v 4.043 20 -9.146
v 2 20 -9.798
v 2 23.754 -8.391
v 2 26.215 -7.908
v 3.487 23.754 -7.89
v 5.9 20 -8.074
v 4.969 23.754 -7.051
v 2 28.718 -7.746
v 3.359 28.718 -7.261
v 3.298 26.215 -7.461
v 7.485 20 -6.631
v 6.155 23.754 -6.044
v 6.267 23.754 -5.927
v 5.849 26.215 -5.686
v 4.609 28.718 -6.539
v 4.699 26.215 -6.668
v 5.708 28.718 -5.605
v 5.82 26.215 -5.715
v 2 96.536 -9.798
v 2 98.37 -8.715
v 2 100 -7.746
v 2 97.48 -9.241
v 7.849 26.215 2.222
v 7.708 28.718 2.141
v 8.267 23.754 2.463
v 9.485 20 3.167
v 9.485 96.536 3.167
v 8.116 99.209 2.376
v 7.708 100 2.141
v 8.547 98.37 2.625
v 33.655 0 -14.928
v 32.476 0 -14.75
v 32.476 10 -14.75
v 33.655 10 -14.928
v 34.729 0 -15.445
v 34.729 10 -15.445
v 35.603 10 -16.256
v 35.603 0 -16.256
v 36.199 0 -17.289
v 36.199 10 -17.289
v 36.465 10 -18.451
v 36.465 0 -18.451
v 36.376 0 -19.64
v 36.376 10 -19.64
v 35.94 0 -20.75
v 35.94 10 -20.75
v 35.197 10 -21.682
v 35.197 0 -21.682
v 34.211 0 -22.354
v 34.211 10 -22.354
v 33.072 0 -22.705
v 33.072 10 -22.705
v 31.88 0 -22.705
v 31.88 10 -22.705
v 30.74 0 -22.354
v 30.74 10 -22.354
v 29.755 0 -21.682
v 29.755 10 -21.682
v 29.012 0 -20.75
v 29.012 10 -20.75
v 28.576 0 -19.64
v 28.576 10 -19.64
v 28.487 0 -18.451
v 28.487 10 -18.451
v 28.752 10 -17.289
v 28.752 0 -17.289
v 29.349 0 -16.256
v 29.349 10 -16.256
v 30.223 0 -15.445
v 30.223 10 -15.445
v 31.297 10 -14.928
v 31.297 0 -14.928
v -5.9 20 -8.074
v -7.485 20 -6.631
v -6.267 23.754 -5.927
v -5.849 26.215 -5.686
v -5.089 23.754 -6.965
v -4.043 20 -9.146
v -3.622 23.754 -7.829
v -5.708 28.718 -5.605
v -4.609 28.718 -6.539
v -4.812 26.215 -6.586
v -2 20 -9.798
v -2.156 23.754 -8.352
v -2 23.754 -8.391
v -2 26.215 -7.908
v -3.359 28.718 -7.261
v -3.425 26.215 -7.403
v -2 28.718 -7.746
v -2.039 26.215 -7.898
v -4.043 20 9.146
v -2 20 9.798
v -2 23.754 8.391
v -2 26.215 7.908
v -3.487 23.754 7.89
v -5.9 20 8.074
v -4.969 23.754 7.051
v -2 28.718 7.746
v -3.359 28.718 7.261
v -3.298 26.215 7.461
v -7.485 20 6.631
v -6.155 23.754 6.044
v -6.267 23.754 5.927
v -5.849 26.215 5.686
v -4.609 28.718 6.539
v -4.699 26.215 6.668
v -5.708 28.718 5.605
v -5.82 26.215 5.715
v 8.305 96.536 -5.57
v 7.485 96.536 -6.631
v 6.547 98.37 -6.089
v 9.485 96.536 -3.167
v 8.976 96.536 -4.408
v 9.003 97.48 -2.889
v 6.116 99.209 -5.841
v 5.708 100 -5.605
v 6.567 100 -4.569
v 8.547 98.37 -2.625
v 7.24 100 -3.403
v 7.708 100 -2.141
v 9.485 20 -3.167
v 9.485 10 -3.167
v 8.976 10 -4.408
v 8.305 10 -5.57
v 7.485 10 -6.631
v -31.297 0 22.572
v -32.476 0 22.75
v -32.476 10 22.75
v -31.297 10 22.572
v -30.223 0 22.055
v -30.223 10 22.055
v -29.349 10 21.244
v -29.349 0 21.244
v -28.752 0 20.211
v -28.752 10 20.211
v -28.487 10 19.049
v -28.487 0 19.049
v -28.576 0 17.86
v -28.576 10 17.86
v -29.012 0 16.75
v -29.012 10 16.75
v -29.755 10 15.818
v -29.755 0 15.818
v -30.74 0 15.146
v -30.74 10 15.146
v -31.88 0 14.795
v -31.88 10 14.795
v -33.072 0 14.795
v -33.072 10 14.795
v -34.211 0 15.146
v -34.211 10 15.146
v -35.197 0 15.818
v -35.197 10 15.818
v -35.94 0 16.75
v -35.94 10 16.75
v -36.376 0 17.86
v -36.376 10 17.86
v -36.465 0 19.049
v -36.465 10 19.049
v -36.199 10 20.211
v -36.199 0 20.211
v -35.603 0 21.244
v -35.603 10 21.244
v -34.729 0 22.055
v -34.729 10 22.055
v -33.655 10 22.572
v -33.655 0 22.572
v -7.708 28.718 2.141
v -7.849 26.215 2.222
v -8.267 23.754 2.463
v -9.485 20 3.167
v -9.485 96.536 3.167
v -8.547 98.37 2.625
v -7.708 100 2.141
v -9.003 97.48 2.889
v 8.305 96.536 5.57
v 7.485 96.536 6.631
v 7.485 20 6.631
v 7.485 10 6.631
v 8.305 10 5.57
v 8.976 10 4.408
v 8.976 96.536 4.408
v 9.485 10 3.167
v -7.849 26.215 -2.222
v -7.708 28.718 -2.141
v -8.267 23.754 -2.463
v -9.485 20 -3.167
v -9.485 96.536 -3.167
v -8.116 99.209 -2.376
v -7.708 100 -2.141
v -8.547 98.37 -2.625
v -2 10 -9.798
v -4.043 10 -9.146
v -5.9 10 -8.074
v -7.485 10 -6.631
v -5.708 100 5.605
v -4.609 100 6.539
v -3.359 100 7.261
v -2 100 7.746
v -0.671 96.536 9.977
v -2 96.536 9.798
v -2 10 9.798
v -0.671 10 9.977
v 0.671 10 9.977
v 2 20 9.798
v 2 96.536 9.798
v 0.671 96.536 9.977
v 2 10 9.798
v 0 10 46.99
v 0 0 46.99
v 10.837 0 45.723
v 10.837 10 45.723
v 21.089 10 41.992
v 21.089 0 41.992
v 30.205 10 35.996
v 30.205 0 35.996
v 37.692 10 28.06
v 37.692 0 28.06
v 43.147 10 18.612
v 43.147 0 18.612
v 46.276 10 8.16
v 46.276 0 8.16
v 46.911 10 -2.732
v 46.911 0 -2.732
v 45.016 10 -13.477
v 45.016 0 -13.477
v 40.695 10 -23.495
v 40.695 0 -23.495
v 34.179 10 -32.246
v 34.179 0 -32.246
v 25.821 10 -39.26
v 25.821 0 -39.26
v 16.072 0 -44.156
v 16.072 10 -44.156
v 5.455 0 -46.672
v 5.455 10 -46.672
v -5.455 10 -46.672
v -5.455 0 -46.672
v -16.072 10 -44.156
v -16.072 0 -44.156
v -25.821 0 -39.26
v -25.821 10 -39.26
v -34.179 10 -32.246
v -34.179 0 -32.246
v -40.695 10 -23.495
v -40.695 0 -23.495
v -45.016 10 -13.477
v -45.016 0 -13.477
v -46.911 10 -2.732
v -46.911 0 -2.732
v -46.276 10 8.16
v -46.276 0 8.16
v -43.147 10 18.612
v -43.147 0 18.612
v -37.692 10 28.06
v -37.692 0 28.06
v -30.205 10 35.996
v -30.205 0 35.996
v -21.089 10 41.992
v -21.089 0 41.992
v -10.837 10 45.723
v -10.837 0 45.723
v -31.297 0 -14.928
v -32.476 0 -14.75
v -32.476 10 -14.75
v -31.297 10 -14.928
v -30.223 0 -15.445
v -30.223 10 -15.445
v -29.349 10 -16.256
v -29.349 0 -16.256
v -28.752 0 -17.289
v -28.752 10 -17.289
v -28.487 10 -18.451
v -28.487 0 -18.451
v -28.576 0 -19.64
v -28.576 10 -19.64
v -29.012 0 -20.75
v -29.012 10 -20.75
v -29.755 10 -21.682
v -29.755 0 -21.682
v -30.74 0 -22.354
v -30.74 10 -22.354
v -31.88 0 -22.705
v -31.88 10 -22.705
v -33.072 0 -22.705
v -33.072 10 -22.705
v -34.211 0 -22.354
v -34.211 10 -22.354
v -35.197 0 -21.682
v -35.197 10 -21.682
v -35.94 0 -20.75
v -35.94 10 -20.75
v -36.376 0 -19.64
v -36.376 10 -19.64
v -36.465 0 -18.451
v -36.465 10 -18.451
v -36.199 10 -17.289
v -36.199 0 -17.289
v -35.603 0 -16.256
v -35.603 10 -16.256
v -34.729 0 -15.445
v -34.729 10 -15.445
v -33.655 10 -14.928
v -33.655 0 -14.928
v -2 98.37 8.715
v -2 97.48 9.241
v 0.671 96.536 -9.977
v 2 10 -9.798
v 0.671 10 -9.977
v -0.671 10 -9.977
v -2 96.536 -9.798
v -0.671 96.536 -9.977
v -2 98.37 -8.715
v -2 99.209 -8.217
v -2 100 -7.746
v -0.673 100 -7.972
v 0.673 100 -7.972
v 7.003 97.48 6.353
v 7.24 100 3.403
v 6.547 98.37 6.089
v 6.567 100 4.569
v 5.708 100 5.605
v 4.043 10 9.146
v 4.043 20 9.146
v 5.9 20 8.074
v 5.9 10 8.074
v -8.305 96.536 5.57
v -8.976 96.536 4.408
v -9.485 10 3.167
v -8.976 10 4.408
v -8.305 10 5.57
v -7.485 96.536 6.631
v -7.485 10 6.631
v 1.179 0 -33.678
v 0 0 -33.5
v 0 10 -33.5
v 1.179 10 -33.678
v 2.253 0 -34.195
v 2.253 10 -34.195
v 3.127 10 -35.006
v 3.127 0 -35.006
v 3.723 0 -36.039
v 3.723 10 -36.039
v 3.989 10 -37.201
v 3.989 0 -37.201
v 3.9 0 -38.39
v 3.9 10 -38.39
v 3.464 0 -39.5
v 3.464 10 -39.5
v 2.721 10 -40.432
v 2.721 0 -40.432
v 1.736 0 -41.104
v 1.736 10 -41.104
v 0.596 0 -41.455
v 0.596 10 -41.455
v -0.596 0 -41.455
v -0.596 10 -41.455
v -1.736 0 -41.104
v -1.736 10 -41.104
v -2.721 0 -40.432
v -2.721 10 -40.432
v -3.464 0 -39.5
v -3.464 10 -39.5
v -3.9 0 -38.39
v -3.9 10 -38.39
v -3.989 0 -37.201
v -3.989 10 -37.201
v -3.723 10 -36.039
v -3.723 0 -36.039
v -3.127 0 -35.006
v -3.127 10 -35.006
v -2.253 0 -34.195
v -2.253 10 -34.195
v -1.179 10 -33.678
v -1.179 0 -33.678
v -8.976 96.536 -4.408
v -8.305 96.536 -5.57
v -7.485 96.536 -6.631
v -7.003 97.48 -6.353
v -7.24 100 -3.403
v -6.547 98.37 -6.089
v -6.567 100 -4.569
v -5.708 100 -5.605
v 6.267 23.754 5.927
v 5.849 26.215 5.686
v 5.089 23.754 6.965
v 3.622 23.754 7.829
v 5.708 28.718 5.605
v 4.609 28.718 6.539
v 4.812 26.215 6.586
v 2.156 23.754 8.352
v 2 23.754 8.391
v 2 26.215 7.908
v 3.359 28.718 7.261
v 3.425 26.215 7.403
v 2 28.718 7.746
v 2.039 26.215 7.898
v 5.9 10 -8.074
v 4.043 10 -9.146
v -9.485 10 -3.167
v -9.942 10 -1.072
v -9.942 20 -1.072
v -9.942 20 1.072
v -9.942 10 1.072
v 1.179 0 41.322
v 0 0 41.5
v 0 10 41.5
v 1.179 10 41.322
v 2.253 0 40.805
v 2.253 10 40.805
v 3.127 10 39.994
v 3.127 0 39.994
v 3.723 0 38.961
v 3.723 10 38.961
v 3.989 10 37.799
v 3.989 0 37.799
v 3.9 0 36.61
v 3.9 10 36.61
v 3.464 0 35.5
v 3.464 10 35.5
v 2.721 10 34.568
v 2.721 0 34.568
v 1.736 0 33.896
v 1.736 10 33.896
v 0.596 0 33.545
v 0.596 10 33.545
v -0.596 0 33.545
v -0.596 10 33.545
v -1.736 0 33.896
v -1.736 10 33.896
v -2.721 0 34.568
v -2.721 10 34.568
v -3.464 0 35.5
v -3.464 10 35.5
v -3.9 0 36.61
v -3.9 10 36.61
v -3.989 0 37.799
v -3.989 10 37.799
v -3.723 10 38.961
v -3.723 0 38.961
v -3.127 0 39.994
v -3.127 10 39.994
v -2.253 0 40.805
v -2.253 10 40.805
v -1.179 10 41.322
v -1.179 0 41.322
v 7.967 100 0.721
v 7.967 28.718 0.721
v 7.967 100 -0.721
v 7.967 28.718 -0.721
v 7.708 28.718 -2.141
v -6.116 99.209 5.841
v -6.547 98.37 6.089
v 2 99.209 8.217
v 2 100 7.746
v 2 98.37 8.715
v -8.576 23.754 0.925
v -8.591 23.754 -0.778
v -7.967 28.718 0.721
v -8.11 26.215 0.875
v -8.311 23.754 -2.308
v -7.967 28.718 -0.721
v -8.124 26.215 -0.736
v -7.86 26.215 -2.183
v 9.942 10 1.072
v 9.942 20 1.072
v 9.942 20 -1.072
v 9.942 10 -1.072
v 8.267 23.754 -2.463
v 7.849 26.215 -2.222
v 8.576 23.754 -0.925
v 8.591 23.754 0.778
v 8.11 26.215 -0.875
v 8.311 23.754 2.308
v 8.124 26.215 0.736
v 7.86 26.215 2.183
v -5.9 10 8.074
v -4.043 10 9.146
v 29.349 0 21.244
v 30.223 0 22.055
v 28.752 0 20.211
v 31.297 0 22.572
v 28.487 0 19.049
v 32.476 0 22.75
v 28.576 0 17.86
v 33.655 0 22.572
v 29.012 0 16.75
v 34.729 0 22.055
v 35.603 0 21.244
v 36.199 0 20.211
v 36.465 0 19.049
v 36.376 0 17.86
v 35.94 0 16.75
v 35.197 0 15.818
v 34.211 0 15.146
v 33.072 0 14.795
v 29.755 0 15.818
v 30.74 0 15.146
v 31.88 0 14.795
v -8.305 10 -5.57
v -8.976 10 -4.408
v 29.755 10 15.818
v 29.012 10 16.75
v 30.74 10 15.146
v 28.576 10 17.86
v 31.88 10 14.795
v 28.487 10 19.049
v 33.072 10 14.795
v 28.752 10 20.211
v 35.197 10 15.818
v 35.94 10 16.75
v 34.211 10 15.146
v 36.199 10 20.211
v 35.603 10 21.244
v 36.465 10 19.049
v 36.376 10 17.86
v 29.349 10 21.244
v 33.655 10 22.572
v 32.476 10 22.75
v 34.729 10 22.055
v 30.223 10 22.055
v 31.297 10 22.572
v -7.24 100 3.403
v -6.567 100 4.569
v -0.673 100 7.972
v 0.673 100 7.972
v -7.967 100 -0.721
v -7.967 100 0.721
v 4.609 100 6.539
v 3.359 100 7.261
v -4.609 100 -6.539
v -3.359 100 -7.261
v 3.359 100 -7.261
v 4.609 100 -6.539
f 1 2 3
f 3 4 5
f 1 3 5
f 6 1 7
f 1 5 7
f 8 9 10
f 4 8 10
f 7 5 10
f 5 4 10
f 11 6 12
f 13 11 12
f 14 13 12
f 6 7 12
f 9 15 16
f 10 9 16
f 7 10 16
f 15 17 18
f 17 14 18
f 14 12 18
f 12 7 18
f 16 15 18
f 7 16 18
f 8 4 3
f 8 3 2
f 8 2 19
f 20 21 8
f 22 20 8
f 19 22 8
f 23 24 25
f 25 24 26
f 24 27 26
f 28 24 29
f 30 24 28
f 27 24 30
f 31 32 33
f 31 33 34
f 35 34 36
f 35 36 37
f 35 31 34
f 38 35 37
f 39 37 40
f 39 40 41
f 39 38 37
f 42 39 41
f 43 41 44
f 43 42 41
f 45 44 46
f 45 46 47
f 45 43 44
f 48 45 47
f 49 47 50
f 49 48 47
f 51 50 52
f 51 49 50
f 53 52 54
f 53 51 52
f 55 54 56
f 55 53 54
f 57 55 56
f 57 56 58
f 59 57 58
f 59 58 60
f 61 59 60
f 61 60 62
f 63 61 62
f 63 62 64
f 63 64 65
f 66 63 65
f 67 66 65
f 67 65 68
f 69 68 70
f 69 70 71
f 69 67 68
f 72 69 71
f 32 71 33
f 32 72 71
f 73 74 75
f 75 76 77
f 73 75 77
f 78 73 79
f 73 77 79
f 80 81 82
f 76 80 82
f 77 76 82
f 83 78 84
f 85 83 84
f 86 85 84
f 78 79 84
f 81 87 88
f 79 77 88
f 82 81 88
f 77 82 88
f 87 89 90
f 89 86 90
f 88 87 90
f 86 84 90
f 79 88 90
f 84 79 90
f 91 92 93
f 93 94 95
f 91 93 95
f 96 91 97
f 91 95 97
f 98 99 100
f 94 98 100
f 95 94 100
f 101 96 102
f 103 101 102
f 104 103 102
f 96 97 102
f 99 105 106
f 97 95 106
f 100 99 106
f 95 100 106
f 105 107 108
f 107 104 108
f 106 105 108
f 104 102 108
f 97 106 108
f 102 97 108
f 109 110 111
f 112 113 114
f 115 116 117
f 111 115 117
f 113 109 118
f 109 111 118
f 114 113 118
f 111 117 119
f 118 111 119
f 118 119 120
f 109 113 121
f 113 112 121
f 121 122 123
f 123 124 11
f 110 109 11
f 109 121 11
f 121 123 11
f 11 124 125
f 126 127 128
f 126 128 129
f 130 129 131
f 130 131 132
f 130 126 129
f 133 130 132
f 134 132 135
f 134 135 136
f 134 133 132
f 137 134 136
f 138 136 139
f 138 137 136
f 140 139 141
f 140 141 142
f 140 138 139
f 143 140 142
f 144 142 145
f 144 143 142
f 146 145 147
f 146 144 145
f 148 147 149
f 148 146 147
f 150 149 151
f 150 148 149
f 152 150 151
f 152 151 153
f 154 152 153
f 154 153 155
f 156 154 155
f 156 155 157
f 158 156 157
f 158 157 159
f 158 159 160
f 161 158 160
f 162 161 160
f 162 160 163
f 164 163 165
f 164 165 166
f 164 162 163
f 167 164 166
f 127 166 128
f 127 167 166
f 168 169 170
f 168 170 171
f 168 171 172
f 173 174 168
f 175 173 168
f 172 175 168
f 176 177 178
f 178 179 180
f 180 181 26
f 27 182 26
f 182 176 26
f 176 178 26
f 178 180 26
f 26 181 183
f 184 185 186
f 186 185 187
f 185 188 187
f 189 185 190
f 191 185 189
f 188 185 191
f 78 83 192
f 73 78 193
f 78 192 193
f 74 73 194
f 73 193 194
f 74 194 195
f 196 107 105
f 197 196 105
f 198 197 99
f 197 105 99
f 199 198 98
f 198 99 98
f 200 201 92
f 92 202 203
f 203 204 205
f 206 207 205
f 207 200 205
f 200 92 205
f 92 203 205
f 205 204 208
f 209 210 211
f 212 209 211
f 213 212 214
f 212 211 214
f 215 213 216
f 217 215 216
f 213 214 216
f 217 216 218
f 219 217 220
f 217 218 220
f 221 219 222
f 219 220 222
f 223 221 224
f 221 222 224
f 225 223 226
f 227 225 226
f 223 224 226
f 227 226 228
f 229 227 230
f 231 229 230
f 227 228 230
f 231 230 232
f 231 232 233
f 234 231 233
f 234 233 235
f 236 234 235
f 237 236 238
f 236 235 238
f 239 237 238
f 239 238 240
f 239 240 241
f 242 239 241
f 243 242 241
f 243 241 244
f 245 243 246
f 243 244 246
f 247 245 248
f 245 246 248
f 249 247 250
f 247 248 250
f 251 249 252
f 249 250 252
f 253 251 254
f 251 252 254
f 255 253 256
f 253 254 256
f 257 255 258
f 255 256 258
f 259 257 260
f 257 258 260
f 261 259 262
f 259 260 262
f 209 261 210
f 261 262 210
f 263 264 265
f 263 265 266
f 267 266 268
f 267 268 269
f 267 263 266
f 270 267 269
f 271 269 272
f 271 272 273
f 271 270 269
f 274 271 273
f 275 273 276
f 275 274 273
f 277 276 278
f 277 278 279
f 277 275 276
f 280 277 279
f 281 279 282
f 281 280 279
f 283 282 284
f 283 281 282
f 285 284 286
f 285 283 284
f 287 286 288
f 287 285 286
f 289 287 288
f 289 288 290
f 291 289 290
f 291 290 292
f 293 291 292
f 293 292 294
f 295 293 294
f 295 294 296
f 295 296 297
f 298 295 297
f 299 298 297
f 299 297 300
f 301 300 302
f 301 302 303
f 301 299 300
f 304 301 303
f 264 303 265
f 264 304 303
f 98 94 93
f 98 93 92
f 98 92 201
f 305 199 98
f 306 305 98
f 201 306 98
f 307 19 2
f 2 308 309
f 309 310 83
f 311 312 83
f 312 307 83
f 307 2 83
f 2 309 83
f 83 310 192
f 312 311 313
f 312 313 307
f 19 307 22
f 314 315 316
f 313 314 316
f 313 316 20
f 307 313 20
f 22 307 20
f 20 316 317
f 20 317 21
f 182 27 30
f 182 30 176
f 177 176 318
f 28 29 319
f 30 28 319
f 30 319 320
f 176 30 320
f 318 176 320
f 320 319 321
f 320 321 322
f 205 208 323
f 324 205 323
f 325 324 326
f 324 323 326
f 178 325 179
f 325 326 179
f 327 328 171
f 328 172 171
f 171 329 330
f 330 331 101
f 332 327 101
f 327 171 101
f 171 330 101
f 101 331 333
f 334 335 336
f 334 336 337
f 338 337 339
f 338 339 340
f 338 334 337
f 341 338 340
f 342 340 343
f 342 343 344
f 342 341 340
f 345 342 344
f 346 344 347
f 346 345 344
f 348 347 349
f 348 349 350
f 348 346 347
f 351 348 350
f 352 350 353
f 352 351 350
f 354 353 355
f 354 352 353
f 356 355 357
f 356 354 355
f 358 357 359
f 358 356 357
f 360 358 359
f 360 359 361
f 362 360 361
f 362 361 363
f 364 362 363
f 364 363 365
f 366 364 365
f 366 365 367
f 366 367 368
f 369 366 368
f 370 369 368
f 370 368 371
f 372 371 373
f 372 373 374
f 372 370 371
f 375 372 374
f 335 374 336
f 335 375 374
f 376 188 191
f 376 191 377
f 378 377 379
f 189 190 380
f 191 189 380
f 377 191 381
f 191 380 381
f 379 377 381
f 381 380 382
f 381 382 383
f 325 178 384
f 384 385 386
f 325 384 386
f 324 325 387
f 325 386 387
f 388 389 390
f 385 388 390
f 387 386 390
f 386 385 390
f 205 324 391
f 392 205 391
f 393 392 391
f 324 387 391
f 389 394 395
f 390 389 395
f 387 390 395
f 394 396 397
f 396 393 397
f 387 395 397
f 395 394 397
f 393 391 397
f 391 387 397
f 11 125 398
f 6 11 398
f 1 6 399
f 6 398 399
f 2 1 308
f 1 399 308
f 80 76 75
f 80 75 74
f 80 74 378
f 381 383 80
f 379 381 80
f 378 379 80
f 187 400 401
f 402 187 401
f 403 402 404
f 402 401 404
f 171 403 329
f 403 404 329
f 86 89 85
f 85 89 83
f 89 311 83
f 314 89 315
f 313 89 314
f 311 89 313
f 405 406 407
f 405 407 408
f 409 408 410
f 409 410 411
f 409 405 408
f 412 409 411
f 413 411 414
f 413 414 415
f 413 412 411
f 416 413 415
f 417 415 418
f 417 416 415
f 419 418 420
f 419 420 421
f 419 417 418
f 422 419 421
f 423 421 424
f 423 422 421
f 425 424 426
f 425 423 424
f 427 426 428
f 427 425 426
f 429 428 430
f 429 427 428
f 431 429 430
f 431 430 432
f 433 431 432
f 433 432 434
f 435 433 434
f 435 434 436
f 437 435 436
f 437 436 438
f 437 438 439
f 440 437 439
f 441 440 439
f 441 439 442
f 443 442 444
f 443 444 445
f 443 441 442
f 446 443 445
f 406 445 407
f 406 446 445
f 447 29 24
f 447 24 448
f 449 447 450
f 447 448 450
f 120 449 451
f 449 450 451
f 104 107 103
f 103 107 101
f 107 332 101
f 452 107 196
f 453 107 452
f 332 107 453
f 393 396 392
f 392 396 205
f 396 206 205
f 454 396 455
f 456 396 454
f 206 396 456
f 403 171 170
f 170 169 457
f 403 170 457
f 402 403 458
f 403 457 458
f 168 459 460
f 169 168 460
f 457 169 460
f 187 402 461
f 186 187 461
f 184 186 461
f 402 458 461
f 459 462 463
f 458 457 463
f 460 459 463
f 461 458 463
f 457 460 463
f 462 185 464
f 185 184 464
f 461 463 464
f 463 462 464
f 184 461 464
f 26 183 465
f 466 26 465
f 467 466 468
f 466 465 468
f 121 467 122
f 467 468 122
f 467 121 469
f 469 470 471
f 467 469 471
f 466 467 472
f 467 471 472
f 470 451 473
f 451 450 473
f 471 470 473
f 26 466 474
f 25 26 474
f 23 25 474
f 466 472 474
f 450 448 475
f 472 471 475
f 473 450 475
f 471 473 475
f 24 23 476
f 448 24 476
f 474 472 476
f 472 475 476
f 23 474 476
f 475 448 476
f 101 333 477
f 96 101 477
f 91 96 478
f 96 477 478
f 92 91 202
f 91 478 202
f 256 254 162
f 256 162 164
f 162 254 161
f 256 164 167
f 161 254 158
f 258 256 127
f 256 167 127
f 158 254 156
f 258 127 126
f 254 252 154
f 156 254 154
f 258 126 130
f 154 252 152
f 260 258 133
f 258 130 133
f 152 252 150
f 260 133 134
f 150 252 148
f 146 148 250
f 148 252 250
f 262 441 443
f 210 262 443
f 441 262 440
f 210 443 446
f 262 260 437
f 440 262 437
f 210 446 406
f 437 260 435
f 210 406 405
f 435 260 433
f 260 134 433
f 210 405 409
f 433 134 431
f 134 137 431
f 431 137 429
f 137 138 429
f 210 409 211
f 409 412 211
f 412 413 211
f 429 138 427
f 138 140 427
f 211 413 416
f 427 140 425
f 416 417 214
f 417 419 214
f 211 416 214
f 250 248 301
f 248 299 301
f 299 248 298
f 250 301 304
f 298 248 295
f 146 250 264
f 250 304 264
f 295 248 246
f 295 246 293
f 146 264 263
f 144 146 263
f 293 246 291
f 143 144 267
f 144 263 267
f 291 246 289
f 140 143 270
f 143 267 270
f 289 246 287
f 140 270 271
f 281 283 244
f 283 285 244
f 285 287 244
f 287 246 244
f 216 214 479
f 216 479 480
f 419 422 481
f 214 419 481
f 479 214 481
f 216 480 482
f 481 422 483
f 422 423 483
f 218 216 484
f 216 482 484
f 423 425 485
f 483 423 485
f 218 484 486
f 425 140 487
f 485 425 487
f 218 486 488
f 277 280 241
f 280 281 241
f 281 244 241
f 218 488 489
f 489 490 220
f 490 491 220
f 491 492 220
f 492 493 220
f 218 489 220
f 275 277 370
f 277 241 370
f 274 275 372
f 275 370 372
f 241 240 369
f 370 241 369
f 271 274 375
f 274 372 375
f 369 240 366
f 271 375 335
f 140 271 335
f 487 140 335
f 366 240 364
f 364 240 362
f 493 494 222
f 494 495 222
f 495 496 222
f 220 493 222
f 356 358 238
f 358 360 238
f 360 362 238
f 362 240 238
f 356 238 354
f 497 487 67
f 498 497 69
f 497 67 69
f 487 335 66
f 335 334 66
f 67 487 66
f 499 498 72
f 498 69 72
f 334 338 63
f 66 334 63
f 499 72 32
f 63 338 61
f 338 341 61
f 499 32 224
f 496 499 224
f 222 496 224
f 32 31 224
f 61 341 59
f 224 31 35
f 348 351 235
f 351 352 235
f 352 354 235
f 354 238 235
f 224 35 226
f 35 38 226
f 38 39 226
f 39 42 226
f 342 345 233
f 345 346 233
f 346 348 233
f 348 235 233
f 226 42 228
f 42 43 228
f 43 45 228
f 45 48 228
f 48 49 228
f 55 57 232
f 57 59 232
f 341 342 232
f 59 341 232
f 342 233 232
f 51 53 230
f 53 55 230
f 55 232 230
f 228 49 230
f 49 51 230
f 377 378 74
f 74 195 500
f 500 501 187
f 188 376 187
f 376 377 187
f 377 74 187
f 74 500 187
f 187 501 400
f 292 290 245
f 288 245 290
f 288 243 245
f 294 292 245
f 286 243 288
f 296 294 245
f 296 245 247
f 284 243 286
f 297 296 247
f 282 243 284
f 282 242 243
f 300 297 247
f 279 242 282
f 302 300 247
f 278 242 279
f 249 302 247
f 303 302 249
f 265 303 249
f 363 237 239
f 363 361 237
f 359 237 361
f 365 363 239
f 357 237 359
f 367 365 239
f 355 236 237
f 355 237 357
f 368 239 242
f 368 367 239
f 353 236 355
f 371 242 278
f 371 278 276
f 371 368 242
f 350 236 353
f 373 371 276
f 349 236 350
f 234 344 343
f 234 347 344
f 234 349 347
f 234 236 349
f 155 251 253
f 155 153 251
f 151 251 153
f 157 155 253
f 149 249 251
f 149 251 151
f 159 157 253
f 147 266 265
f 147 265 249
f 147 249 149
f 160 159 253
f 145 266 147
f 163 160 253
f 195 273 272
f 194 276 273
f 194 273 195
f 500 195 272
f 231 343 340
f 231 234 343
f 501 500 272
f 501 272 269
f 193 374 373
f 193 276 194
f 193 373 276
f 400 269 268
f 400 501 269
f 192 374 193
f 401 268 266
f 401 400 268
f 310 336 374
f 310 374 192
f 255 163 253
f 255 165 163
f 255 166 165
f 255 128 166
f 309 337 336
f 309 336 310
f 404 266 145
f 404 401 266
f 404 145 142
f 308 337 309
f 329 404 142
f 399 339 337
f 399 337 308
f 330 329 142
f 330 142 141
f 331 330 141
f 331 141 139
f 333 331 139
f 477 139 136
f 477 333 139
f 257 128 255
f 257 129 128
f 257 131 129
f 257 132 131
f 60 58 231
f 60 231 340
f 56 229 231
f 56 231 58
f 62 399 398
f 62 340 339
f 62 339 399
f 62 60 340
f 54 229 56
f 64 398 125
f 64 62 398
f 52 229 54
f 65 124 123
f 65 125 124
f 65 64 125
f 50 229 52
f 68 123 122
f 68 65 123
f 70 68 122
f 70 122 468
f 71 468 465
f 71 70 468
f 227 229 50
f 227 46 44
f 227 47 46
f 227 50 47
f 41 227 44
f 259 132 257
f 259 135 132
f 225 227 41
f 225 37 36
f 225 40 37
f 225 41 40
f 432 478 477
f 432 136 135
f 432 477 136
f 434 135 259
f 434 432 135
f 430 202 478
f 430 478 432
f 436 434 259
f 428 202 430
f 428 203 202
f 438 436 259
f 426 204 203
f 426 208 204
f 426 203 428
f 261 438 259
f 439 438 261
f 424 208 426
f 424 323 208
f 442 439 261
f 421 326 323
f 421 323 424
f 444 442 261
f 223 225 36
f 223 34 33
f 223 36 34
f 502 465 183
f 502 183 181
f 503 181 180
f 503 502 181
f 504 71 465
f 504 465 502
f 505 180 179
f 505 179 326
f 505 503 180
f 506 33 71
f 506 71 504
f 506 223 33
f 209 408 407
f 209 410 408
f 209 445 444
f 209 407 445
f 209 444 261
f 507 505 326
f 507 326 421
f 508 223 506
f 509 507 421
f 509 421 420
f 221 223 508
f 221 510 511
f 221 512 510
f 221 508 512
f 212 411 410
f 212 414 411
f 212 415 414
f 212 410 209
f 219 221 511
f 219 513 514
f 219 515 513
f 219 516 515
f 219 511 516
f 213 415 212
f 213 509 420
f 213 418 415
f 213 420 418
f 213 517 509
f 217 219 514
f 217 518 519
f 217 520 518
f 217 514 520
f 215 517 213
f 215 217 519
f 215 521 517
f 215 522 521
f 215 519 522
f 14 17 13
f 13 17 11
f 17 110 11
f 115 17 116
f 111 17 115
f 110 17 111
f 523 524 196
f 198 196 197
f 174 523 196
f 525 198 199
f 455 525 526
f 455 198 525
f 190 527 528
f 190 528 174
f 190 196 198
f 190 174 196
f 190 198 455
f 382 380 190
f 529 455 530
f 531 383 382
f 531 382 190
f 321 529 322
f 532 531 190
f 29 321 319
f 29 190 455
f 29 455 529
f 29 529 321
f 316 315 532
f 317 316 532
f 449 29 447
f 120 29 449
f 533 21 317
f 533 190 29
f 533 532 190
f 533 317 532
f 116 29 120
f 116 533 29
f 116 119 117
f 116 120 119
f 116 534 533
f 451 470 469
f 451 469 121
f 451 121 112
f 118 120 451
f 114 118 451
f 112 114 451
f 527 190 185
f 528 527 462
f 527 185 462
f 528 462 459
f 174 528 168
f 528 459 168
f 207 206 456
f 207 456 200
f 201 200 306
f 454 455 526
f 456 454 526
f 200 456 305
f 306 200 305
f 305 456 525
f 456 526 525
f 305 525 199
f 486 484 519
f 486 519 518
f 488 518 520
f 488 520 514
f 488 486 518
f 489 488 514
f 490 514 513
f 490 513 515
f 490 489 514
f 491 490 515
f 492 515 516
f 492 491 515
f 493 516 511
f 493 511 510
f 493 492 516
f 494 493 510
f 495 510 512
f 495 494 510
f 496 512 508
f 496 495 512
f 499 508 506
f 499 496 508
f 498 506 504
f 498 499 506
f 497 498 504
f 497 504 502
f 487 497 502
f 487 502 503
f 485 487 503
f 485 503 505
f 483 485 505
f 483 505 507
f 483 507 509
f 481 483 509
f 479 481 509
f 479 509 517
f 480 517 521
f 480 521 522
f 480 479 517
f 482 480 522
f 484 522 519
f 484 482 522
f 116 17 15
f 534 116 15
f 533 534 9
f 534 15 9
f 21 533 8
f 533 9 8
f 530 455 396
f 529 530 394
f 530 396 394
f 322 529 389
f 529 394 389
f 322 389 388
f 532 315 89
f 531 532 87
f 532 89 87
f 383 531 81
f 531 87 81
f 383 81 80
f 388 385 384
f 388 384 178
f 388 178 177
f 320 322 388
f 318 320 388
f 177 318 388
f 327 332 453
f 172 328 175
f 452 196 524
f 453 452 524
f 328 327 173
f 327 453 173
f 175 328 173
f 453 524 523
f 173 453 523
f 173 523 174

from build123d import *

# Parameters (mm, degrees)
SKETCH1_R           = 46.99
SKETCH1_R_2         = 8.509
SKETCH1_R_3         = 4
BOSS_EXTRUDE1_DEPTH = 10
BOSS_EXTRUDE2_DEPTH = 90
SKETCH4_R           = 10
BOSS_EXTRUDE3_DEPTH = 10
FILLET2_R           = 20


with BuildPart() as part:
    # Sketch1 → Boss-Extrude1 (new body)
    # profile 1 of 2: a face of its own
    with BuildSketch(Plane(origin=(0, 0, 0), x_dir=(1, 0, 0), z_dir=(0, 1, 0))):
        with Locations(Location((0, 0, 0), (0, 0, 270))):
            Circle(SKETCH1_R)
        Circle(SKETCH1_R_2, mode=Mode.SUBTRACT)
        with Locations(Location((-32.475952642, 18.75, 0), (0, 0, 270))):
            Circle(SKETCH1_R_3, mode=Mode.SUBTRACT)
        with Locations(Location((-32.475952642, -18.75, 0), (0, 0, 270))):
            Circle(SKETCH1_R_3, mode=Mode.SUBTRACT)
        with Locations(Location((0, -37.5, 0), (0, 0, 270))):
            Circle(SKETCH1_R_3, mode=Mode.SUBTRACT)
        with Locations(Location((32.475952642, -18.75, 0), (0, 0, 270))):
            Circle(SKETCH1_R_3, mode=Mode.SUBTRACT)
        with Locations(Location((32.475952642, 18.75, 0), (0, 0, 270))):
            Circle(SKETCH1_R_3, mode=Mode.SUBTRACT)
        with Locations(Location((0, 37.5, 0), (0, 0, 270))):
            Circle(SKETCH1_R_3, mode=Mode.SUBTRACT)
    # profile 2 of 2: a face of its own
    with BuildSketch(Plane(origin=(0, 0, 0), x_dir=(1, 0, 0), z_dir=(0, 1, 0))):
        Circle(SKETCH1_R_2)
    extrude(amount=BOSS_EXTRUDE1_DEPTH)

    # Sketch2 → Boss-Extrude2 (add)
    with BuildSketch(Plane(origin=(0, 10, 0), x_dir=(1, 0, 0), z_dir=(0, 1, 0))):
        with BuildLine():
            Line((-5.708203932, 5.605034154), (-7.485281374, 6.631030293))
            ThreePointArc((-7.485281374, 6.631030293), (-8.660254038, 5), (-9.485281374, 3.166928678))
            Line((-9.485281374, 3.166928678), (-7.708203932, 2.140932539))
            ThreePointArc((-7.708203932, 2.140932539), (-8, 0), (-7.708203932, -2.140932539))
            Line((-7.708203932, -2.140932539), (-9.485281374, -3.166928678))
            ThreePointArc((-9.485281374, -3.166928678), (-8.660254038, -5), (-7.485281374, -6.631030293))
            Line((-7.485281374, -6.631030293), (-5.708203932, -5.605034154))
            ThreePointArc((-5.708203932, -5.605034154), (-4, -6.92820323), (-2, -7.745966692))
            Line((-2, -7.745966692), (-2, -9.797958971))
            ThreePointArc((-2, -9.797958971), (0, -10), (2, -9.797958971))
            Line((2, -9.797958971), (2, -7.745966692))
            ThreePointArc((2, -7.745966692), (4, -6.92820323), (5.708203932, -5.605034154))
            Line((5.708203932, -5.605034154), (7.485281374, -6.631030293))
            ThreePointArc((7.485281374, -6.631030293), (8.660254038, -5), (9.485281374, -3.166928678))
            Line((9.485281374, -3.166928678), (7.708203932, -2.140932539))
            ThreePointArc((7.708203932, -2.140932539), (8, 0), (7.708203932, 2.140932539))
            Line((7.708203932, 2.140932539), (9.485281374, 3.166928678))
            ThreePointArc((9.485281374, 3.166928678), (8.660254038, 5), (7.485281374, 6.631030293))
            Line((7.485281374, 6.631030293), (5.708203932, 5.605034154))
            ThreePointArc((5.708203932, 5.605034154), (4, 6.92820323), (2, 7.745966692))
            Line((2, 7.745966692), (2, 9.797958971))
            ThreePointArc((2, 9.797958971), (0, 10), (-2, 9.797958971))
            Line((-2, 9.797958971), (-2, 7.745966692))
            ThreePointArc((-2, 7.745966692), (-4, 6.92820323), (-5.708203932, 5.605034154))
        make_face()
    extrude(amount=BOSS_EXTRUDE2_DEPTH)

    # Sketch4 → Boss-Extrude3 (add)
    with BuildSketch(Plane(origin=(0, 10, 0), x_dir=(1, 0, 0), z_dir=(0, 1, 0))):
        with Locations(Location((0, 0, 0), (0, 0, 101.536959033))):
            Circle(SKETCH4_R)
    extrude(amount=BOSS_EXTRUDE3_DEPTH)

    # Fillet2
    # the kernel refuses this fillet: 20 mm, written as the material it adds along each edge
    with BuildSketch(Plane(origin=(0, 20, 0), x_dir=(0.9893271243483546, 0, 0.1457114993012412), z_dir=(0.1457114993012412, 0, -0.9893271243483546))) as fillet2_piece_1:
        with BuildLine():
            CenterArc((28, -8.717797887), FILLET2_R, 154.158067237, 25.841932763)
            Line((8, -8.717797887), (8, 0))
            Line((8, 0), (10, 0))
        make_face()
    revolve(axis=Axis((0, 20, 0), (0, -1, 0)), revolution_arc=343.243034599)
    with BuildSketch(Plane(origin=(0, 20, 0), x_dir=(0.6208534221926202, 0, -0.7839266726880214), z_dir=(-0.7839266726880214, 0, -0.6208534221926202))) as fillet2_piece_2:
        with BuildLine():
            CenterArc((28, -8.717797887), FILLET2_R, 154.158067237, 25.841932763)
            Line((8, -8.717797887), (8, 0))
            Line((8, 0), (10, 0))
        make_face()
    revolve(axis=Axis((0, 20, 0), (0, -1, 0)), revolution_arc=343.243034599)
    with BuildSketch(Plane(origin=(0, 20, 0), x_dir=(-0.36847370215574865, 0, -0.9296381719893158), z_dir=(-0.9296381719893158, 0, 0.36847370215574865))) as fillet2_piece_3:
        with BuildLine():
            CenterArc((28, -8.717797887), FILLET2_R, 154.158067237, 25.841932763)
            Line((10, 0), (8, 0))
            Line((8, 0), (8, -8.717797887))
        make_face()
    revolve(axis=Axis((0, 20, 0), (0, -1, 0)), revolution_arc=343.243034599)
    with BuildSketch(Plane(origin=(0, 20, 0), x_dir=(-0.9893271243483555, 0, -0.14571149930123434), z_dir=(-0.14571149930123434, 0, 0.9893271243483555))) as fillet2_piece_4:
        with BuildLine():
            CenterArc((28, -8.717797887), FILLET2_R, 154.158067237, 25.841932763)
            Line((10, 0), (8, 0))
            Line((8, 0), (8, -8.717797887))
        make_face()
    revolve(axis=Axis((0, 20, 0), (0, -1, 0)), revolution_arc=343.243034599)
    with BuildSketch(Plane(origin=(0, 20, 0), x_dir=(-0.6208534221925923, 0, 0.7839266726880435), z_dir=(0.7839266726880435, 0, 0.6208534221925923))) as fillet2_piece_5:
        with BuildLine():
            CenterArc((28, -8.717797887), FILLET2_R, 154.158067237, 25.841932763)
            Line((8, -8.717797887), (8, 0))
            Line((8, 0), (10, 0))
        make_face()
    revolve(axis=Axis((0, 20, 0), (0, -1, 0)), revolution_arc=343.243034599)
    with BuildSketch(Plane(origin=(0, 20, 0), x_dir=(0.3684737021557518, 0, 0.9296381719893145), z_dir=(0.9296381719893145, 0, -0.3684737021557518))) as fillet2_piece_6:
        with BuildLine():
            CenterArc((28, -8.717797887), FILLET2_R, 154.158067237, 25.841932763)
            Line((8, -8.717797887), (8, 0))
            Line((8, 0), (10, 0))
        make_face()
    revolve(axis=Axis((0, 20, 0), (0, -1, 0)), revolution_arc=343.243034599)

    # Sketch7 → Cut-Revolve1 (revolve, cut)
    with BuildSketch(Plane(origin=(0, 0, 0), x_dir=(0, 0, -1), z_dir=(1, 0, 0)), mode=Mode.PRIVATE) as cut_revolve1_sk:
        Polygon((10, 100), (10, 96.535898385), (8, 100), align=None)
    revolve(cut_revolve1_sk.sketch.rotate(Axis((0, 136.433969782, 0), (0, -1, 0)), 348.463040967), axis=Axis((0, 136.433969782, 0), (0, -1, 0)), mode=Mode.SUBTRACT)


solid = part.part
